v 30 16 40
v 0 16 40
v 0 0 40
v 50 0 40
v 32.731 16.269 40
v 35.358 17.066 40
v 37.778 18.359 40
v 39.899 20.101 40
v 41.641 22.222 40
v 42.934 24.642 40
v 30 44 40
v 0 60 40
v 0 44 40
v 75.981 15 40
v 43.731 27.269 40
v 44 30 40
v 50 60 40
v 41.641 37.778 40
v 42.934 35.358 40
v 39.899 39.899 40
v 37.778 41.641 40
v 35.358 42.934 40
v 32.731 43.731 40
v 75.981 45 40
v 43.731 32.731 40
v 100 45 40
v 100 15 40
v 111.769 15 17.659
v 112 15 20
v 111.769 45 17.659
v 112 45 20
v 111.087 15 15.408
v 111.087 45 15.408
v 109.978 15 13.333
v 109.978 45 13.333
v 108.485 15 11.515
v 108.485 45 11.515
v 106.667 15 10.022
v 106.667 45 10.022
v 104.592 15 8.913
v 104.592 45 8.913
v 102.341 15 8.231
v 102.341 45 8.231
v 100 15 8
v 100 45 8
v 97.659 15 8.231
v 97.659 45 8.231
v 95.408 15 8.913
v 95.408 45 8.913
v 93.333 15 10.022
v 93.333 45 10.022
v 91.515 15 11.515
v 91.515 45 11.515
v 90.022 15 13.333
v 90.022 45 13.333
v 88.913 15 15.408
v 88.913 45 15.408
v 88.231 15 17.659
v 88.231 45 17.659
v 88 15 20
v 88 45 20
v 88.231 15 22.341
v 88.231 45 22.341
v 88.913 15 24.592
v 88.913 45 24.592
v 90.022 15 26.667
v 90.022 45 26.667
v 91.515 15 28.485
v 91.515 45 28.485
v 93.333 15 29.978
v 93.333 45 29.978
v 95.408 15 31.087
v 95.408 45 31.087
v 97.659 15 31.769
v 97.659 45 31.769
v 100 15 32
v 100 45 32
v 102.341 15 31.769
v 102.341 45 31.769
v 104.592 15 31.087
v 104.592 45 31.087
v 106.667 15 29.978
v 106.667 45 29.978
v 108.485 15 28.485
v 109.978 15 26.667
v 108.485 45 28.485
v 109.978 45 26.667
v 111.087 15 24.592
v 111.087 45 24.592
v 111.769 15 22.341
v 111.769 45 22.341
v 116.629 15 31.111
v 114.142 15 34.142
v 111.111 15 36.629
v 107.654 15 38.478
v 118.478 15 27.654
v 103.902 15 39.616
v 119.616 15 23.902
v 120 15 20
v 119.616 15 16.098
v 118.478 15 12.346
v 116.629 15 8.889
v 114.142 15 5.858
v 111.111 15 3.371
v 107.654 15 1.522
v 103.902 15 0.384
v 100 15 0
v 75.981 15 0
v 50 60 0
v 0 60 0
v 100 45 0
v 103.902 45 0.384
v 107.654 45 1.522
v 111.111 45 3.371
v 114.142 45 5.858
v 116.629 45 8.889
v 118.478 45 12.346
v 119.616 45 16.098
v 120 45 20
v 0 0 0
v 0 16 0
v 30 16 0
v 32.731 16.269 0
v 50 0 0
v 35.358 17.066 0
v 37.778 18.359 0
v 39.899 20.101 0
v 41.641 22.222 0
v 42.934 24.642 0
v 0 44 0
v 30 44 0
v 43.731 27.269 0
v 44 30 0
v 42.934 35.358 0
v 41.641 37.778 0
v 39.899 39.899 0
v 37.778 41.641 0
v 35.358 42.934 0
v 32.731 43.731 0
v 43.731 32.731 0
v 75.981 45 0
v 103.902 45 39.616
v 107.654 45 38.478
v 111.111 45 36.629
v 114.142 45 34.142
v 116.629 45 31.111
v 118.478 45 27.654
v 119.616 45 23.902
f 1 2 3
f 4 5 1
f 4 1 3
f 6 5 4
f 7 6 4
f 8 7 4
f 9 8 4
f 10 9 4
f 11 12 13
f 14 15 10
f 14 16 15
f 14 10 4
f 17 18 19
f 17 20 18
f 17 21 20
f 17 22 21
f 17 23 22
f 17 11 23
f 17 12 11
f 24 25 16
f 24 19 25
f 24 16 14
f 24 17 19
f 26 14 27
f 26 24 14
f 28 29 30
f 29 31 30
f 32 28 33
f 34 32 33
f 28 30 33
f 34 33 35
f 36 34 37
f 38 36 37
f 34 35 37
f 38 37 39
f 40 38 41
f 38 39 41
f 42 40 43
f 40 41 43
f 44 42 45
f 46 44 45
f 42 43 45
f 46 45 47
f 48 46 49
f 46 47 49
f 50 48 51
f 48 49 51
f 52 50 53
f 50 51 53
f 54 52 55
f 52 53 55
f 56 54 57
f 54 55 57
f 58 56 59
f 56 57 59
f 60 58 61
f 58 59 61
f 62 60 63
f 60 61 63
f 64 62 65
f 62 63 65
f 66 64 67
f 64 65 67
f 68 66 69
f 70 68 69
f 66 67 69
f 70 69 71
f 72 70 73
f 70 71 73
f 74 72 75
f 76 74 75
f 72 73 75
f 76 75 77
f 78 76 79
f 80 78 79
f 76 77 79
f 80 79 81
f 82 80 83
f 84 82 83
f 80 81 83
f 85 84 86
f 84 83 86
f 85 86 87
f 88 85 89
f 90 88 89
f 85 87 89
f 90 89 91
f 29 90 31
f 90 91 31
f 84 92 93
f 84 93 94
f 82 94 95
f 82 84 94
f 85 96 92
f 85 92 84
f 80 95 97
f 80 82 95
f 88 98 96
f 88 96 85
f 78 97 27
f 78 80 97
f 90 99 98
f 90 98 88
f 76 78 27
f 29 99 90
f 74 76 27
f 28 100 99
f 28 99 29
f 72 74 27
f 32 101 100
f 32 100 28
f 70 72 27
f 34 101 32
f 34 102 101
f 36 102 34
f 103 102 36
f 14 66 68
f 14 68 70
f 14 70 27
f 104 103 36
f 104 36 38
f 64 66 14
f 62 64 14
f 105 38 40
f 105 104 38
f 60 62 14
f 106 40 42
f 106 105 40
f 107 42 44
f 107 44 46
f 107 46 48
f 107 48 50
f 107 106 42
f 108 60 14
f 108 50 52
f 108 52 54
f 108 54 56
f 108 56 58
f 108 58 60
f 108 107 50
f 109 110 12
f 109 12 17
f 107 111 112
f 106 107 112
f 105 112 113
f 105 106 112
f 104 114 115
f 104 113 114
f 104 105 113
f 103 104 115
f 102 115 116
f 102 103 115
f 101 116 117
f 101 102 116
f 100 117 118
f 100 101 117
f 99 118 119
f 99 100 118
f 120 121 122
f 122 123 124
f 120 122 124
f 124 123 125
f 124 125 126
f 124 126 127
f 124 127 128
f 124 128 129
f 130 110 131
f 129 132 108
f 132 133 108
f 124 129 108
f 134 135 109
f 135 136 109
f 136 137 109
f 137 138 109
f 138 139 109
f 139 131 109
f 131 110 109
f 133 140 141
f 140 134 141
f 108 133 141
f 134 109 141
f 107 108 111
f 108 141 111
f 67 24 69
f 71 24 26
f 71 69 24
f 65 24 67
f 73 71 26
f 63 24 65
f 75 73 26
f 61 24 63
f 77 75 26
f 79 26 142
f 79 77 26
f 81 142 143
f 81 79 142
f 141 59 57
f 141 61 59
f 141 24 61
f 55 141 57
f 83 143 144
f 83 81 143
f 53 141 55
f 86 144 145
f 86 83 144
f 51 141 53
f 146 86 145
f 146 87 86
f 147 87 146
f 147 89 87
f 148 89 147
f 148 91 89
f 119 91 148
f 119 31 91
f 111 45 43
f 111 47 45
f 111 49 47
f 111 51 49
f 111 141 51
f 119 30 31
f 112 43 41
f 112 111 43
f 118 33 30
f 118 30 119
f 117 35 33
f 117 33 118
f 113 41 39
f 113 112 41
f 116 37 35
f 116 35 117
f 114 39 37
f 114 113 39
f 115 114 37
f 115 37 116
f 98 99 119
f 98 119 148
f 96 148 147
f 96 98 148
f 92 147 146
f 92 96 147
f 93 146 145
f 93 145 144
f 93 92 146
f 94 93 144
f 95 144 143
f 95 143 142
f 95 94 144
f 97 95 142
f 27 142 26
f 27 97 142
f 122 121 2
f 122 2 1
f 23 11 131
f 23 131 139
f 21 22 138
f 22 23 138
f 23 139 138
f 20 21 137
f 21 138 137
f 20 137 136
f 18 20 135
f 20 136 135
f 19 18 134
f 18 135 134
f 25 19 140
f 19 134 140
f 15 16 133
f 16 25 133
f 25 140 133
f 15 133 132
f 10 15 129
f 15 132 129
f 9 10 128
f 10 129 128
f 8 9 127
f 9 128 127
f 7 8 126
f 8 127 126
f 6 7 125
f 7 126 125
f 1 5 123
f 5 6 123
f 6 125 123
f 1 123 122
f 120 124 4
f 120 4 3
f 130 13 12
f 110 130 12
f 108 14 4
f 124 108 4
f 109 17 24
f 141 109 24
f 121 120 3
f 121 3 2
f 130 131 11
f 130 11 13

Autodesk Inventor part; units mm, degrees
ref_plane "YZ Plane" through (0, 0, 0) normal (1, 0, 0) x (0, 1, 0)
ref_plane "XZ Plane" through (0, 0, 0) normal (0, 1, 0) x (-1, 0, 0)
ref_plane "XY Plane" through (0, 0, 0) normal (0, 0, 1) x (1, 0, 0)
sketch "草圖1" plane through (0, 0, 0) normal (0, 0, 1) x (1, 0, 0)
  line L0 (0, 0) -> (0, 16)
  line L1 (0, 16) -> (30, 16)
  line L2 (30, 44) -> (0, 44)
  line L3 (0, 44) -> (0, 60)
  line L4 (0, 60) -> (50, 60)
  line L5 (50, 60) -> (75.9808, 45)
  line L6 (75.9808, 45) -> (120, 45)
  line L7 (120, 45) -> (120, 15)
  line L8 (120, 15) -> (75.9808, 15)
  line L9 (75.9808, 15) -> (50, 0)
  line L10 (50, 0) -> (0, 0)
  arc A0 (30, 16) -> (30, 44) centre (30, 30) ccw
  dimension "d0" = 60
  dimension "d1" = 50
  dimension "d3" = 30
  dimension "d5" = 30
  dimension "d6" = 120
  dimension "d8" = 28
  dimension "d10" = 16
  dimension "d13" = 50
  dimension "d25" = 45
  dimension "d26" = 30
  dimension "d27" = 30
extrude "擠出1" add sketch "草圖1" along normal blind 40
fillet "圓角1" radius 20 2 edges at (120, 30, 40) (120, 30, 0)
sketch "草圖2" plane through (75.9808, 45, 40) normal (0, 1, 0) x (1, 0, 0)
  arc A0 (24.0192, 0) -> (24.0192, 40) centre (24.0192, 20) ccw projected
  circle A1 centre (24.0192, 20) radius 12
  point P0 (-75.9808, 40)
  dimension "d49" = 24
extrude "擠出2" cut sketch "草圖2" against normal blind 40
properties part number "複習一"
